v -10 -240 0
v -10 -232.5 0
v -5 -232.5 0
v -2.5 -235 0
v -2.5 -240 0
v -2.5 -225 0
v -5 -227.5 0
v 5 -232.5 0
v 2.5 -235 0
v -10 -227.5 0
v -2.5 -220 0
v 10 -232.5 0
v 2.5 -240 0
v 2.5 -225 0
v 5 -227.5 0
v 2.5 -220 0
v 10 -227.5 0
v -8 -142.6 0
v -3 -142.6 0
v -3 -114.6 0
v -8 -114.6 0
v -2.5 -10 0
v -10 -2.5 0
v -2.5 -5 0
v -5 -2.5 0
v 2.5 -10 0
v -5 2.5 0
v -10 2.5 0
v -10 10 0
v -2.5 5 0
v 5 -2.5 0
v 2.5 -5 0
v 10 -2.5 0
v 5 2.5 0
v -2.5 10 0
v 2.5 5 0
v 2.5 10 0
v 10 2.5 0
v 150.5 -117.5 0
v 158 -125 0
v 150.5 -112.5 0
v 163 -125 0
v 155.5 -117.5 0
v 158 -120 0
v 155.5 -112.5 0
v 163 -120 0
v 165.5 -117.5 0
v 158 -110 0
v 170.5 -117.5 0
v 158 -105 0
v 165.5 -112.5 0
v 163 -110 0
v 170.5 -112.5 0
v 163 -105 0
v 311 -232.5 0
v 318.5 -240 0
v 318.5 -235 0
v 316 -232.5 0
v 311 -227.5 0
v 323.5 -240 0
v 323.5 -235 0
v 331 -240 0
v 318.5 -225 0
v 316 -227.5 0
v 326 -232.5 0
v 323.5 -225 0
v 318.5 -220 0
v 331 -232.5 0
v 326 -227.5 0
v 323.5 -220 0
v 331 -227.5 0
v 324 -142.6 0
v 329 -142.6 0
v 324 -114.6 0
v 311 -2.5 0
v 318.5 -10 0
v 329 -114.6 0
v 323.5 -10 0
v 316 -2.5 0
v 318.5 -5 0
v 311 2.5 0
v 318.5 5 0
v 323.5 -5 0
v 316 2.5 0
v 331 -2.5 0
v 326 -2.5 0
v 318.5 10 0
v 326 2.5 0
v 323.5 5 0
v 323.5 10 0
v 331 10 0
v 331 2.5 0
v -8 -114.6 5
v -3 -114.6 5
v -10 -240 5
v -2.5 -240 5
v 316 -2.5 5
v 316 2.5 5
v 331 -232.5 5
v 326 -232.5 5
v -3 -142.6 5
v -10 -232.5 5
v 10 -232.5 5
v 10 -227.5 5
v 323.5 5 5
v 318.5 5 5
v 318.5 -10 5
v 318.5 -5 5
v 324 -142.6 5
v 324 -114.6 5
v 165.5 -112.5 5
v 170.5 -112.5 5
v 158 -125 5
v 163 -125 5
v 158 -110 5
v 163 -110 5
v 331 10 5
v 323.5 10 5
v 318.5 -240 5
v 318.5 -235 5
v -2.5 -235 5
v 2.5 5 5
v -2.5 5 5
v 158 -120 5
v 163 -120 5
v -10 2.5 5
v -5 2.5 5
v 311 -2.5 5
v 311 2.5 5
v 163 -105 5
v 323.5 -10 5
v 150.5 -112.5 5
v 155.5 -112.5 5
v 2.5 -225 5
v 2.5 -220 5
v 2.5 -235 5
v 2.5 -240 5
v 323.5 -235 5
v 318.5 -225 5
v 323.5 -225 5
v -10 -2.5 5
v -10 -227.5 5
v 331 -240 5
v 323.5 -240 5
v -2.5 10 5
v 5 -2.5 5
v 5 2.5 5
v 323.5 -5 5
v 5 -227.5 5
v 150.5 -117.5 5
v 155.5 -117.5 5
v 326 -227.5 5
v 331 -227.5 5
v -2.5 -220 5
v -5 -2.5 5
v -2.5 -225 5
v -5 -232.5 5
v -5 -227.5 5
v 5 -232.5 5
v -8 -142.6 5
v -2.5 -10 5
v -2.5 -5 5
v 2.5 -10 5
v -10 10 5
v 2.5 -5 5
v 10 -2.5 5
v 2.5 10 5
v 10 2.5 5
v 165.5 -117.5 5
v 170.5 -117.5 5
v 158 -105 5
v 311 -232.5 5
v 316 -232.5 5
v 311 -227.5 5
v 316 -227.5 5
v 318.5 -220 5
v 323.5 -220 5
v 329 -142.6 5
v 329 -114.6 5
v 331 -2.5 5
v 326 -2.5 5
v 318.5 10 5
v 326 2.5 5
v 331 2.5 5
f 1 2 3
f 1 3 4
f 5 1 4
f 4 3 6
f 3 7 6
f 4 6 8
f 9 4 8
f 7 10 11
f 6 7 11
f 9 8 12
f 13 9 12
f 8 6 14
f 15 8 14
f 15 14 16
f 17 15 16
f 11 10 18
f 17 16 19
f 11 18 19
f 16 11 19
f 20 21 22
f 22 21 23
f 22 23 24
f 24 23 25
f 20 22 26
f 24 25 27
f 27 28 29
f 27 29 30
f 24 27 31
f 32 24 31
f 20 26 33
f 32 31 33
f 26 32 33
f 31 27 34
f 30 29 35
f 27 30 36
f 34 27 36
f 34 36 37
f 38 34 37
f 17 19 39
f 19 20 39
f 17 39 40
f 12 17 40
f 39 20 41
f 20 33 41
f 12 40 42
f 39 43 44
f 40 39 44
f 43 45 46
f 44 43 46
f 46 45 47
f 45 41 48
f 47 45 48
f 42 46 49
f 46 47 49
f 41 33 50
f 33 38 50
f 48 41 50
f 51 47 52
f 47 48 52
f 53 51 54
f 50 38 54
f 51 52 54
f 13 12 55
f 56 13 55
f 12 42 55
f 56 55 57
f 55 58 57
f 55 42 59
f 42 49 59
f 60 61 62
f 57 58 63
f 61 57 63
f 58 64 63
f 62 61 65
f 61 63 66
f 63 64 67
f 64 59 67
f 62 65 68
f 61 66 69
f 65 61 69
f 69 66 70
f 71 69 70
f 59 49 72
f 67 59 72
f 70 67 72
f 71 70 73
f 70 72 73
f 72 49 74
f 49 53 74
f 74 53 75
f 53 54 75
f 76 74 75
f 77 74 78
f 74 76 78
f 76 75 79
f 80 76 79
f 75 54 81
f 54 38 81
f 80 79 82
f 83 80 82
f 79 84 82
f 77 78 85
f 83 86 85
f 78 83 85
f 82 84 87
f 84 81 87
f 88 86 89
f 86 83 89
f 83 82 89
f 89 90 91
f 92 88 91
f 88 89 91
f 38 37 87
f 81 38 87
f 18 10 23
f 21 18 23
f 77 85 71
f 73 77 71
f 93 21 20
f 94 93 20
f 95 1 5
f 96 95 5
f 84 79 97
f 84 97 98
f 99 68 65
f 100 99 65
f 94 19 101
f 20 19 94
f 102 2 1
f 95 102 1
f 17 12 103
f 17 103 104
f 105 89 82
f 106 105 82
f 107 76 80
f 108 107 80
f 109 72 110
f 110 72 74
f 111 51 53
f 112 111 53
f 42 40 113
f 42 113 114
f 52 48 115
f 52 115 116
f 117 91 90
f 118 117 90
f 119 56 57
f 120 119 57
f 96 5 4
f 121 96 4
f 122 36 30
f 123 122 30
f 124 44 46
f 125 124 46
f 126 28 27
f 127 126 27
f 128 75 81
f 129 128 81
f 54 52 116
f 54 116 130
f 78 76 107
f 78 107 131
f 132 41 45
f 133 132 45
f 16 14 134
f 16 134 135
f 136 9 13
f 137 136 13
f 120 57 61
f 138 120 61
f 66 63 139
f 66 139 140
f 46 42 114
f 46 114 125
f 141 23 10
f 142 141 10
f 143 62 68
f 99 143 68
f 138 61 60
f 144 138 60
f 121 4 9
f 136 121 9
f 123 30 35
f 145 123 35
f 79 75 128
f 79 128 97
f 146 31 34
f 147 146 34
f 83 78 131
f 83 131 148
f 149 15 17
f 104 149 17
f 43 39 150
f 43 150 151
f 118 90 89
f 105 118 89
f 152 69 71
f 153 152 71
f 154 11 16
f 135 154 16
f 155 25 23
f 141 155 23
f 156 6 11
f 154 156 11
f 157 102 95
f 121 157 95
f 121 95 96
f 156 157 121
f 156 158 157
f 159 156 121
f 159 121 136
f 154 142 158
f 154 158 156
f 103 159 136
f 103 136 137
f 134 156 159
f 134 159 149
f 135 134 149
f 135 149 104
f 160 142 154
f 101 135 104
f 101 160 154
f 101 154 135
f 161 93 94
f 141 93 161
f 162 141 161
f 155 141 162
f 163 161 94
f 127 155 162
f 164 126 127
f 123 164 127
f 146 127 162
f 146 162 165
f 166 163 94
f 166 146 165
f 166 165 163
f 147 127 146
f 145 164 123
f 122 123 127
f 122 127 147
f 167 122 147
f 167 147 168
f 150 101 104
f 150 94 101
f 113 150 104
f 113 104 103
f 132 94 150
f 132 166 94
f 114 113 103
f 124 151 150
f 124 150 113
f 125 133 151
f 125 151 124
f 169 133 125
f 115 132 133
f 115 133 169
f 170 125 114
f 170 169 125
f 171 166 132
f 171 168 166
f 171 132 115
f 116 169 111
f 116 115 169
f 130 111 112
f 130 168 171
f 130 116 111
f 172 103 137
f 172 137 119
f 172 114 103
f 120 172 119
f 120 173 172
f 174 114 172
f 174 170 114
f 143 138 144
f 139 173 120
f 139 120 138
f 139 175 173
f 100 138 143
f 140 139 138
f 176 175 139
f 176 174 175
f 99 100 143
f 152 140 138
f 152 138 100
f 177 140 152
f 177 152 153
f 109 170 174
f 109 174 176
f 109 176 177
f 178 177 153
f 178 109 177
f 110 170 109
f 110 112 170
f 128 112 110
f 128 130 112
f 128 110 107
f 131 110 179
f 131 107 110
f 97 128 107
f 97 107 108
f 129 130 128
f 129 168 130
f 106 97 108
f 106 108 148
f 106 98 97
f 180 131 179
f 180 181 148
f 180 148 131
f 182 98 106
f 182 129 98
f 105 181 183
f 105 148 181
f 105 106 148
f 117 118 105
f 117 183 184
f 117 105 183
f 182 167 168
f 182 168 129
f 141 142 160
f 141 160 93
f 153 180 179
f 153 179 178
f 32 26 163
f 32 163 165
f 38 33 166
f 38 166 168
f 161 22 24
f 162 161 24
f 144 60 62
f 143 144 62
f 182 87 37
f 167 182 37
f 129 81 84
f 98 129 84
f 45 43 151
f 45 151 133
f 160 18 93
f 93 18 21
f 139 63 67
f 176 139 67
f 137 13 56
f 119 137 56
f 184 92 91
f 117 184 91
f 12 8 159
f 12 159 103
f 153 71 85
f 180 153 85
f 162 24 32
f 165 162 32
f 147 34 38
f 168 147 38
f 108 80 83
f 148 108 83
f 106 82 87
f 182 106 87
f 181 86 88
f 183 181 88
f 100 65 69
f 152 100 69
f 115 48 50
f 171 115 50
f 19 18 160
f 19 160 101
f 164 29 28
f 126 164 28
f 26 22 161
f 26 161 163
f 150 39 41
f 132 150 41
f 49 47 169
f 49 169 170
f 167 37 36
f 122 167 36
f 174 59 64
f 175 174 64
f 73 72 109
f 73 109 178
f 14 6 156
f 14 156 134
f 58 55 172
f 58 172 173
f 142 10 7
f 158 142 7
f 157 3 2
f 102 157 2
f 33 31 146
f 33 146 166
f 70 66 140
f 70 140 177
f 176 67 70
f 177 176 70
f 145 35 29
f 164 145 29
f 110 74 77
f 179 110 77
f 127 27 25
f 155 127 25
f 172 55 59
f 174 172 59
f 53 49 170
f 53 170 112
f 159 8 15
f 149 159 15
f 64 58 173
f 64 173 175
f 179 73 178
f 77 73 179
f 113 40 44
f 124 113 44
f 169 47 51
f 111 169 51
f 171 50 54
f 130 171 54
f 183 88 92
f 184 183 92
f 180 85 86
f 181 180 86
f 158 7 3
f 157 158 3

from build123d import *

# Parameters (mm, degrees)
SKETCH1_W           = 5
SKETCH1_H           = 28.000000001
SKETCH1_H_2         = 5
BOSS_EXTRUDE1_DEPTH = 5


with BuildPart() as part:
    # Sketch1 → Boss-Extrude1 (new body)
    with BuildSketch(Plane.XY):
        Polygon((331, 10), (323.5, 10), (323.5, 5), (318.5, 5), (318.5, 10), (2.5, 10), (2.5, 5), (-2.5, 5), (-2.5, 10), (-10, 10), (-10, 2.5), (-5, 2.5), (-5, -2.5), (-10, -2.5), (-10, -227.5), (-5, -227.5), (-5, -232.5), (-10, -232.5), (-10, -240), (-2.5, -240), (-2.5, -235), (2.5, -235), (2.5, -240), (318.5, -240), (318.5, -235), (323.5, -235), (323.5, -240), (331, -240), (331, -232.5), (326, -232.5), (326, -227.5), (331, -227.5), (331, -2.5), (326, -2.5), (326, 2.5), (331, 2.5), align=None)
        with Locations((-5.5, -128.600000001)):
            Rectangle(SKETCH1_W, SKETCH1_H, mode=Mode.SUBTRACT)
        with Locations((326.5, -128.600000001)):
            Rectangle(SKETCH1_W, SKETCH1_H, mode=Mode.SUBTRACT)
        with Locations((313.5, 0)):
            Rectangle(SKETCH1_W, SKETCH1_H_2, mode=Mode.SUBTRACT)
        with Locations((321, -7.5)):
            Rectangle(SKETCH1_W, SKETCH1_H_2, mode=Mode.SUBTRACT)
        with Locations((0, -7.5)):
            Rectangle(SKETCH1_W, SKETCH1_H_2, mode=Mode.SUBTRACT)
        with Locations((7.5, 0)):
            Rectangle(SKETCH1_W, SKETCH1_H_2, mode=Mode.SUBTRACT)
        with Locations((160.5, -122.5)):
            Rectangle(SKETCH1_W, SKETCH1_H_2, mode=Mode.SUBTRACT)
        with Locations((168, -115)):
            Rectangle(SKETCH1_W, SKETCH1_H_2, mode=Mode.SUBTRACT)
        with Locations((153, -115)):
            Rectangle(SKETCH1_W, SKETCH1_H_2, mode=Mode.SUBTRACT)
        with Locations((160.5, -107.5)):
            Rectangle(SKETCH1_W, SKETCH1_H_2, mode=Mode.SUBTRACT)
        with Locations((7.5, -230)):
            Rectangle(SKETCH1_W, SKETCH1_H_2, mode=Mode.SUBTRACT)
        with Locations((0, -222.5)):
            Rectangle(SKETCH1_W, SKETCH1_H_2, mode=Mode.SUBTRACT)
        with Locations((321, -222.5)):
            Rectangle(SKETCH1_W, SKETCH1_H_2, mode=Mode.SUBTRACT)
        with Locations((313.5, -230)):
            Rectangle(SKETCH1_W, SKETCH1_H_2, mode=Mode.SUBTRACT)
    extrude(amount=BOSS_EXTRUDE1_DEPTH)


solid = part.part
